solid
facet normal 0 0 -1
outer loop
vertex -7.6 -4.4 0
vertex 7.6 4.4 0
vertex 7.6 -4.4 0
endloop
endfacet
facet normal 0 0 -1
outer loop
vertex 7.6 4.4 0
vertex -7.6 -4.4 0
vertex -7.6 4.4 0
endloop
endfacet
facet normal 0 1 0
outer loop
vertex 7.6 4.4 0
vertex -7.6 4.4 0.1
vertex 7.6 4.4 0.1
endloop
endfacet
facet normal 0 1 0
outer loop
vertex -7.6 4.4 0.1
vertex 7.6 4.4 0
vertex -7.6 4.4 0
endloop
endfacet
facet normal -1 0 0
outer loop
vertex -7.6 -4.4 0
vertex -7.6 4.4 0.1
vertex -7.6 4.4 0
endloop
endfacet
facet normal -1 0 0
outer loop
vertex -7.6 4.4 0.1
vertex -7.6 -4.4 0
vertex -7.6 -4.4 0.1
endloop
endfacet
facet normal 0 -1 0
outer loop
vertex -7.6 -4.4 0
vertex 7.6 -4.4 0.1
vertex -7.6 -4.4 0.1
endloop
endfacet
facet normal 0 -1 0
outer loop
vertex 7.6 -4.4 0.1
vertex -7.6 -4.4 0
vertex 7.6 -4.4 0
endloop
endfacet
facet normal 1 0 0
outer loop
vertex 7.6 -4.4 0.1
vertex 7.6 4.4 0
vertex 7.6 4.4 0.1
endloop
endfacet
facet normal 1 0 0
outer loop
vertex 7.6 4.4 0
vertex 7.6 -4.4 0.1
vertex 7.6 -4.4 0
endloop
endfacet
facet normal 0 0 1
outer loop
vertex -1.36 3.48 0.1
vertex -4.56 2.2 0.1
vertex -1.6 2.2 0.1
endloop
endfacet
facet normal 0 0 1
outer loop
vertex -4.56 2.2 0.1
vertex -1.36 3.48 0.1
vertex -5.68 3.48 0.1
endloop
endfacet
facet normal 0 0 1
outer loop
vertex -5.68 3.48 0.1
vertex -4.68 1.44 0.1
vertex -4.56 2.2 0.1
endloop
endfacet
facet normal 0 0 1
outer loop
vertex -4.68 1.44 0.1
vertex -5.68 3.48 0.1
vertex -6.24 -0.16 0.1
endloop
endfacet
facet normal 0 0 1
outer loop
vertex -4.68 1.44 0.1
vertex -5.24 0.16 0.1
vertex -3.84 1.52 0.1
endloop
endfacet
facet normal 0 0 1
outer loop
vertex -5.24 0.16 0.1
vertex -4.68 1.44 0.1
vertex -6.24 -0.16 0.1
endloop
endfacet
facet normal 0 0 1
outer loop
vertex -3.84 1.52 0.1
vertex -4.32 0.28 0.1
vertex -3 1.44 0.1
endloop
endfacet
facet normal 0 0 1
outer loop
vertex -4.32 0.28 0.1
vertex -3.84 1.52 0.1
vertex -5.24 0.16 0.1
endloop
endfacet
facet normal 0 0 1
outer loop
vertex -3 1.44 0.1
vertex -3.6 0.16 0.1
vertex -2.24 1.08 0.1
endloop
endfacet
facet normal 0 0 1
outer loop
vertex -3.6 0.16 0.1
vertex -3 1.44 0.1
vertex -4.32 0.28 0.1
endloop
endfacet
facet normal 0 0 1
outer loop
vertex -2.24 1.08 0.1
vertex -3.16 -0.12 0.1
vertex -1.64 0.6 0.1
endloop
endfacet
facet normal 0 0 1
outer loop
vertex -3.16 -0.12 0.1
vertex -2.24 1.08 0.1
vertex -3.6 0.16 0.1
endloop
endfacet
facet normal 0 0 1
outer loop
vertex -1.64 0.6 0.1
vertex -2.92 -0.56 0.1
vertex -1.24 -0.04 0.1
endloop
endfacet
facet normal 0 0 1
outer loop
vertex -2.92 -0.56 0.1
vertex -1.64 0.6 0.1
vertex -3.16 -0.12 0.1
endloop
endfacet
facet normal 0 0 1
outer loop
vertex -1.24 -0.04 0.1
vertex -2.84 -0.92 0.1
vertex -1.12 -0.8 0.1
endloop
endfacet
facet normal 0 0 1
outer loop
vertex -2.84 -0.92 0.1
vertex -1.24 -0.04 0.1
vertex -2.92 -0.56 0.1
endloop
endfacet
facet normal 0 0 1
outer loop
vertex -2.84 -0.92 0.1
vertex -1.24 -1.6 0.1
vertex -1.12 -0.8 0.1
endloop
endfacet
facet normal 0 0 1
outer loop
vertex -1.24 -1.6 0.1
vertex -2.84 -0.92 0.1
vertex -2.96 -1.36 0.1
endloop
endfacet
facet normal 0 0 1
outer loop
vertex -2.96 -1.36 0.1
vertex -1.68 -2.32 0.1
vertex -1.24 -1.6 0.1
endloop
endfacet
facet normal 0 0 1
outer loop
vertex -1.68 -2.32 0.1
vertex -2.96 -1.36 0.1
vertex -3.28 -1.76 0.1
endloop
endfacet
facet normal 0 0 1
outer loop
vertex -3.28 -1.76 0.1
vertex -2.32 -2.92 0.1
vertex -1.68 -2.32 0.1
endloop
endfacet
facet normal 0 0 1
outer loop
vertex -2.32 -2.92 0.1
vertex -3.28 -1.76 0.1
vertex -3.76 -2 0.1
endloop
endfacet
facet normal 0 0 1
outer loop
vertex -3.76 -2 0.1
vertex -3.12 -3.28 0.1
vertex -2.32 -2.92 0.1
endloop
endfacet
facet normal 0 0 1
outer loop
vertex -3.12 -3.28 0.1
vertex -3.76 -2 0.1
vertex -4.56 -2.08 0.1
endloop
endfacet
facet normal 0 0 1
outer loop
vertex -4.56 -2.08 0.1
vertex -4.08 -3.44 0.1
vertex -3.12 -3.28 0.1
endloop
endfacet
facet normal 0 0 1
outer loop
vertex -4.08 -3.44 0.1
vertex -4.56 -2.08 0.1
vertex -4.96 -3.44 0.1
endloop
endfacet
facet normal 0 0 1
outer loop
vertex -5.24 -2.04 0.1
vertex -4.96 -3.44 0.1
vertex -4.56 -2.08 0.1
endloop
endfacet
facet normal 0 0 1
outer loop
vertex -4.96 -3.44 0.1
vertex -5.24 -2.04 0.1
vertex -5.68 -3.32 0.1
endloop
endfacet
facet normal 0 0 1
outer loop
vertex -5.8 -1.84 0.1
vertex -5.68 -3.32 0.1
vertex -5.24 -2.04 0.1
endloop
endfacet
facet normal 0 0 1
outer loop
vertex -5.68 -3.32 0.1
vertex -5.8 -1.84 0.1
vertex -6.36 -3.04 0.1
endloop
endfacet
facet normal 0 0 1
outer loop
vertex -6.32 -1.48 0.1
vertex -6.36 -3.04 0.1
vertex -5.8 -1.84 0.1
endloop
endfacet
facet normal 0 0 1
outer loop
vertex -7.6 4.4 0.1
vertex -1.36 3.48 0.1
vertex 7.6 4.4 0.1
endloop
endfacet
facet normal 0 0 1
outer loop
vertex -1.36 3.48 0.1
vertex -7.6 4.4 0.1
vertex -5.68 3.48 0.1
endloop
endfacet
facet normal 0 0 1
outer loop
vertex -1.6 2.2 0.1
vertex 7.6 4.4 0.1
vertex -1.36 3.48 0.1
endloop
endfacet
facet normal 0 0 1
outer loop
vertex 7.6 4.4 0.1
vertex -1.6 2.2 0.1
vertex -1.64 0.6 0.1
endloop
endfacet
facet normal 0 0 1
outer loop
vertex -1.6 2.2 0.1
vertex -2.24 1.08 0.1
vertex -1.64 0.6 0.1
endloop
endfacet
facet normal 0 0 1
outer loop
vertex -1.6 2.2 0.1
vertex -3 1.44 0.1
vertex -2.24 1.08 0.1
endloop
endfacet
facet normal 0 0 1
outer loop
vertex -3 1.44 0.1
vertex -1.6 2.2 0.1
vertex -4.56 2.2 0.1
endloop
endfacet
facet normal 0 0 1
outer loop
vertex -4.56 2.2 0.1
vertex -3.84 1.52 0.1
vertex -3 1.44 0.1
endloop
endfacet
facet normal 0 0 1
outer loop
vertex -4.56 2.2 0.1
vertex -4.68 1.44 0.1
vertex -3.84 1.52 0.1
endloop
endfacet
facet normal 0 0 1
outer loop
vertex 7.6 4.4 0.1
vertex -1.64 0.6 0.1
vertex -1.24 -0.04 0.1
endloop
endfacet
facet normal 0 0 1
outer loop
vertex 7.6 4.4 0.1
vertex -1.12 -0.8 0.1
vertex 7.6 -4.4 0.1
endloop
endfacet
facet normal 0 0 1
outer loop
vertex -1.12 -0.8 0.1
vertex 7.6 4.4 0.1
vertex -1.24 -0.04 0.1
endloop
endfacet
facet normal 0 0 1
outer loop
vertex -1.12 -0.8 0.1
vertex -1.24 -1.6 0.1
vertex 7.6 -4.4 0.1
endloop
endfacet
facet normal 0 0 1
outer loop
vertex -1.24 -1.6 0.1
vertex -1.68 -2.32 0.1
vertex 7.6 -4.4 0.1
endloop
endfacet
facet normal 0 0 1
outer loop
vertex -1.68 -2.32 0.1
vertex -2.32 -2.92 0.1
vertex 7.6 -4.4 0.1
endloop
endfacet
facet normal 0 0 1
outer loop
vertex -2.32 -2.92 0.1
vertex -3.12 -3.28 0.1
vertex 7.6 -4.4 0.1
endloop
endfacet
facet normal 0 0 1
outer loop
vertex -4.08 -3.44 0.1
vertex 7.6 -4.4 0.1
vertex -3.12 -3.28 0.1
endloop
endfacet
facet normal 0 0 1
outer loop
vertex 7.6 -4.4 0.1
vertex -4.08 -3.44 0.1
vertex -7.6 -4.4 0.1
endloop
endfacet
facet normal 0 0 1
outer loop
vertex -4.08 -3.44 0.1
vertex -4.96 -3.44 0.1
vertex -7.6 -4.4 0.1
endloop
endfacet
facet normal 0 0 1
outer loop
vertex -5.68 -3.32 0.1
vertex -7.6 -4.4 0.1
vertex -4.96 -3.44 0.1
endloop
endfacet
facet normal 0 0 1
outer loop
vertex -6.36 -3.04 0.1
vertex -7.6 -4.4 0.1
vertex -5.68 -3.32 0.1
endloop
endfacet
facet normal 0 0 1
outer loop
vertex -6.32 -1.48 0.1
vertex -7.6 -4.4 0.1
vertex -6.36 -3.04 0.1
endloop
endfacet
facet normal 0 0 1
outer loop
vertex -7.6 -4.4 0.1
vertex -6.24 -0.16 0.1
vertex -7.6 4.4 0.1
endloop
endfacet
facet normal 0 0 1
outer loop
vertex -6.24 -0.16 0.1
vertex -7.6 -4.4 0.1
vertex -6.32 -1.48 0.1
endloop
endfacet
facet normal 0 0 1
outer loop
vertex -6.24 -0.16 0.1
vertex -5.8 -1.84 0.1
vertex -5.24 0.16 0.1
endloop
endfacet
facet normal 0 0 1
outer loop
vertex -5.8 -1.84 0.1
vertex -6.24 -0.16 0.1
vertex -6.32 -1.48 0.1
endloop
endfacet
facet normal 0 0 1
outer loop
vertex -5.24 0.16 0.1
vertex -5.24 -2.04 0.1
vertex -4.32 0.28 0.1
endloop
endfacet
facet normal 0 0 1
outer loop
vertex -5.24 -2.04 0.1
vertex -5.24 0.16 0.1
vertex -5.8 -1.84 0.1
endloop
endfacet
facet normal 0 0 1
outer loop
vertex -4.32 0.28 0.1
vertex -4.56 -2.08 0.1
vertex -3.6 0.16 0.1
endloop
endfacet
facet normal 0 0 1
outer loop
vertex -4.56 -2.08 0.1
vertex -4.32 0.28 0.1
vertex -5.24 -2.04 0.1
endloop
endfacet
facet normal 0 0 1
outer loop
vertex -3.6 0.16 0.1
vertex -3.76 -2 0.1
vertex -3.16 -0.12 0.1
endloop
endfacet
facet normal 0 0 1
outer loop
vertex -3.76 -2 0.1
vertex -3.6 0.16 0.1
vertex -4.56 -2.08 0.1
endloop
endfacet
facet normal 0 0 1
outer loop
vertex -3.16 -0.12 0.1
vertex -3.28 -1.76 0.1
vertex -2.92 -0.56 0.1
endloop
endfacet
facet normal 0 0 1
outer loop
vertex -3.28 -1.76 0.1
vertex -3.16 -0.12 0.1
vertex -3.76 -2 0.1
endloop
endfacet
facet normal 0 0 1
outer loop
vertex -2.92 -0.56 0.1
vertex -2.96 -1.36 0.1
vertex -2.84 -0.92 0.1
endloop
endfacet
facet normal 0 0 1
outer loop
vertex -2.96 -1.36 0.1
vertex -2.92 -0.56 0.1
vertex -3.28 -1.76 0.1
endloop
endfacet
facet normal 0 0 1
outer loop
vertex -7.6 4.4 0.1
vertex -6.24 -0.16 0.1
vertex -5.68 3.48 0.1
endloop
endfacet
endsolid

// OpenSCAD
// file: ../p/box5-12.scad
use <../lib.scad>
function ldraw_lib__box5_12() = [
// 0 Box with 5 Faces without Any Edges
// 0 Name: box5-12.dat
// 0 Author: Chris Dee [cwdee]
// 0 !LDRAW_ORG Primitive UPDATE 2009-02
// 0 !LICENSE Licensed under CC BY 4.0 : see CAreadme.txt
// 
// 0 BFC CERTIFY CCW
  [0,"BFC","CERTIFY"],
  [0,"BFC","CCW"],
// 
// 0 !HISTORY 2009-09-03 [PTadmin] Official Update 2009-02
// 
// 
// 4 16 1 1 1 1 1 -1 -1 1 -1 -1 1 1
  [4,16,1,1,1,1,1,-1,-1,1,-1,-1,1,1],
// 4 16 -1 0 1 1 0 1 1 1 1 -1 1 1
  [4,16,-1,0,1,1,0,1,1,1,1,-1,1,1],
// 4 16 -1 0 -1 -1 0 1 -1 1 1 -1 1 -1
  [4,16,-1,0,-1,-1,0,1,-1,1,1,-1,1,-1],
// 4 16 1 0 -1 -1 0 -1 -1 1 -1 1 1 -1
  [4,16,1,0,-1,-1,0,-1,-1,1,-1,1,1,-1],
// 4 16 1 0 1 1 0 -1 1 1 -1 1 1 1
  [4,16,1,0,1,1,0,-1,1,1,-1,1,1,1],
// 0
];
module ldraw_lib__box5_12(step=0, col=false, unit=2/5, alt=false, line=0.2, solid=!$preview)
    makepoly(ldraw_lib__box5_12(), step=step, col=col, unit=unit, alt=alt, line=line, solid=solid);
ldraw_lib__box5_12(line=0.2);
// main file
use <../lib.scad>
use <../p/box5-12.scad>
function ldraw_lib__168055b() = [
// 0 Sticker  1.1 x  1.9 with Left White Number Five on Blue Background
// 0 Name: 168055b.dat
// 0 Author: Takeshi Takahashi [RainbowDolphin]
// 0 !LDRAW_ORG Part UPDATE 2024-03
// 0 !LICENSE Licensed under CC BY 4.0 : see CAreadme.txt
// 
// 0 BFC CERTIFY CCW
  [0,"BFC","CERTIFY"],
  [0,"BFC","CCW"],
// 
// 0 !KEYWORDS Formula 1, race car, Renault, Set 1750
// 
// 0 !HISTORY 2024-04-28 [OrionP] Official Update 2024-03
// 
// 
// 1 16 0 -0.25 0 19 0 0 0 0.25 0 0 0 11 box5-12.dat
  [1,16,0,-0.25,0,19,0,0,0,0.25,0,0,0,11, ldraw_lib__box5_12()],
// 4 15 -4 -0.25 5.5 -3.4 -0.25 8.7 -14.2 -0.25 8.7 -11.4 -0.25 5.5
  [4,15,-4,-0.25,5.5,-3.4,-0.25,8.7,-14.2,-0.25,8.7,-11.4,-0.25,5.5],
// 4 15 -11.7 -0.25 3.6 -11.4 -0.25 5.5 -14.2 -0.25 8.7 -15.6 -0.25 -0.4
  [4,15,-11.7,-0.25,3.6,-11.4,-0.25,5.5,-14.2,-0.25,8.7,-15.6,-0.25,-0.4],
// 4 15 -11.7 -0.25 3.6 -15.6 -0.25 -0.4 -13.1 -0.25 0.4 -9.6 -0.25 3.8
  [4,15,-11.7,-0.25,3.6,-15.6,-0.25,-0.4,-13.1,-0.25,0.4,-9.6,-0.25,3.8],
// 4 15 -9.6 -0.25 3.8 -13.1 -0.25 0.4 -10.8 -0.25 0.7 -7.5 -0.25 3.6
  [4,15,-9.6,-0.25,3.8,-13.1,-0.25,0.4,-10.8,-0.25,0.7,-7.5,-0.25,3.6],
// 4 15 -7.5 -0.25 3.6 -10.8 -0.25 0.7 -9 -0.25 0.4 -5.6 -0.25 2.7
  [4,15,-7.5,-0.25,3.6,-10.8,-0.25,0.7,-9,-0.25,0.4,-5.6,-0.25,2.7],
// 4 15 -5.6 -0.25 2.7 -9 -0.25 0.4 -7.9 -0.25 -0.3 -4.1 -0.25 1.5
  [4,15,-5.6,-0.25,2.7,-9,-0.25,0.4,-7.9,-0.25,-0.3,-4.1,-0.25,1.5],
// 4 15 -4.1 -0.25 1.5 -7.9 -0.25 -0.3 -7.3 -0.25 -1.4 -3.1 -0.25 -0.1
  [4,15,-4.1,-0.25,1.5,-7.9,-0.25,-0.3,-7.3,-0.25,-1.4,-3.1,-0.25,-0.1],
// 4 15 -3.1 -0.25 -0.1 -7.3 -0.25 -1.4 -7.1 -0.25 -2.3 -2.8 -0.25 -2
  [4,15,-3.1,-0.25,-0.1,-7.3,-0.25,-1.4,-7.1,-0.25,-2.3,-2.8,-0.25,-2],
// 4 15 -2.8 -0.25 -2 -7.1 -0.25 -2.3 -7.4 -0.25 -3.4 -3.1 -0.25 -4
  [4,15,-2.8,-0.25,-2,-7.1,-0.25,-2.3,-7.4,-0.25,-3.4,-3.1,-0.25,-4],
// 4 15 -4.2 -0.25 -5.8 -3.1 -0.25 -4 -7.4 -0.25 -3.4 -8.2 -0.25 -4.4
  [4,15,-4.2,-0.25,-5.8,-3.1,-0.25,-4,-7.4,-0.25,-3.4,-8.2,-0.25,-4.4],
// 4 15 -5.8 -0.25 -7.3 -4.2 -0.25 -5.8 -8.2 -0.25 -4.4 -9.4 -0.25 -5
  [4,15,-5.8,-0.25,-7.3,-4.2,-0.25,-5.8,-8.2,-0.25,-4.4,-9.4,-0.25,-5],
// 4 15 -7.8 -0.25 -8.2 -5.8 -0.25 -7.3 -9.4 -0.25 -5 -11.4 -0.25 -5.2
  [4,15,-7.8,-0.25,-8.2,-5.8,-0.25,-7.3,-9.4,-0.25,-5,-11.4,-0.25,-5.2],
// 4 15 -10.2 -0.25 -8.6 -7.8 -0.25 -8.2 -11.4 -0.25 -5.2 -12.4 -0.25 -8.6
  [4,15,-10.2,-0.25,-8.6,-7.8,-0.25,-8.2,-11.4,-0.25,-5.2,-12.4,-0.25,-8.6],
// 4 15 -12.4 -0.25 -8.6 -11.4 -0.25 -5.2 -13.1 -0.25 -5.1 -14.2 -0.25 -8.3
  [4,15,-12.4,-0.25,-8.6,-11.4,-0.25,-5.2,-13.1,-0.25,-5.1,-14.2,-0.25,-8.3],
// 4 15 -14.2 -0.25 -8.3 -13.1 -0.25 -5.1 -14.5 -0.25 -4.6 -15.9 -0.25 -7.6
  [4,15,-14.2,-0.25,-8.3,-13.1,-0.25,-5.1,-14.5,-0.25,-4.6,-15.9,-0.25,-7.6],
// 3 15 -15.8 -0.25 -3.7 -15.9 -0.25 -7.6 -14.5 -0.25 -4.6
  [3,15,-15.8,-0.25,-3.7,-15.9,-0.25,-7.6,-14.5,-0.25,-4.6],
// 4 1 -3.4 -0.25 8.7 19 -0.25 11 -19 -0.25 11 -14.2 -0.25 8.7
  [4,1,-3.4,-0.25,8.7,19,-0.25,11,-19,-0.25,11,-14.2,-0.25,8.7],
// 4 1 19 -0.25 11 -3.4 -0.25 8.7 -4 -0.25 5.5 -4.1 -0.25 1.5
  [4,1,19,-0.25,11,-3.4,-0.25,8.7,-4,-0.25,5.5,-4.1,-0.25,1.5],
// 3 1 -4 -0.25 5.5 -5.6 -0.25 2.7 -4.1 -0.25 1.5
  [3,1,-4,-0.25,5.5,-5.6,-0.25,2.7,-4.1,-0.25,1.5],
// 4 1 -7.5 -0.25 3.6 -5.6 -0.25 2.7 -4 -0.25 5.5 -11.4 -0.25 5.5
  [4,1,-7.5,-0.25,3.6,-5.6,-0.25,2.7,-4,-0.25,5.5,-11.4,-0.25,5.5],
// 3 1 -11.4 -0.25 5.5 -9.6 -0.25 3.8 -7.5 -0.25 3.6
  [3,1,-11.4,-0.25,5.5,-9.6,-0.25,3.8,-7.5,-0.25,3.6],
// 3 1 -11.4 -0.25 5.5 -11.7 -0.25 3.6 -9.6 -0.25 3.8
  [3,1,-11.4,-0.25,5.5,-11.7,-0.25,3.6,-9.6,-0.25,3.8],
// 3 1 19 -0.25 11 -4.1 -0.25 1.5 -3.1 -0.25 -0.1
  [3,1,19,-0.25,11,-4.1,-0.25,1.5,-3.1,-0.25,-0.1],
// 4 1 19 -0.25 11 -3.1 -0.25 -0.1 -2.8 -0.25 -2 19 -0.25 -11
  [4,1,19,-0.25,11,-3.1,-0.25,-0.1,-2.8,-0.25,-2,19,-0.25,-11],
// 3 1 -2.8 -0.25 -2 -3.1 -0.25 -4 19 -0.25 -11
  [3,1,-2.8,-0.25,-2,-3.1,-0.25,-4,19,-0.25,-11],
// 3 1 -3.1 -0.25 -4 -4.2 -0.25 -5.8 19 -0.25 -11
  [3,1,-3.1,-0.25,-4,-4.2,-0.25,-5.8,19,-0.25,-11],
// 3 1 -4.2 -0.25 -5.8 -5.8 -0.25 -7.3 19 -0.25 -11
  [3,1,-4.2,-0.25,-5.8,-5.8,-0.25,-7.3,19,-0.25,-11],
// 3 1 -5.8 -0.25 -7.3 -7.8 -0.25 -8.2 19 -0.25 -11
  [3,1,-5.8,-0.25,-7.3,-7.8,-0.25,-8.2,19,-0.25,-11],
// 4 1 19 -0.25 -11 -7.8 -0.25 -8.2 -10.2 -0.25 -8.6 -19 -0.25 -11
  [4,1,19,-0.25,-11,-7.8,-0.25,-8.2,-10.2,-0.25,-8.6,-19,-0.25,-11],
// 3 1 -10.2 -0.25 -8.6 -12.4 -0.25 -8.6 -19 -0.25 -11
  [3,1,-10.2,-0.25,-8.6,-12.4,-0.25,-8.6,-19,-0.25,-11],
// 3 1 -14.2 -0.25 -8.3 -19 -0.25 -11 -12.4 -0.25 -8.6
  [3,1,-14.2,-0.25,-8.3,-19,-0.25,-11,-12.4,-0.25,-8.6],
// 3 1 -15.9 -0.25 -7.6 -19 -0.25 -11 -14.2 -0.25 -8.3
  [3,1,-15.9,-0.25,-7.6,-19,-0.25,-11,-14.2,-0.25,-8.3],
// 3 1 -15.8 -0.25 -3.7 -19 -0.25 -11 -15.9 -0.25 -7.6
  [3,1,-15.8,-0.25,-3.7,-19,-0.25,-11,-15.9,-0.25,-7.6],
// 4 1 -19 -0.25 -11 -15.8 -0.25 -3.7 -15.6 -0.25 -0.4 -19 -0.25 11
  [4,1,-19,-0.25,-11,-15.8,-0.25,-3.7,-15.6,-0.25,-0.4,-19,-0.25,11],
// 4 1 -13.1 -0.25 0.4 -15.6 -0.25 -0.4 -15.8 -0.25 -3.7 -14.5 -0.25 -4.6
  [4,1,-13.1,-0.25,0.4,-15.6,-0.25,-0.4,-15.8,-0.25,-3.7,-14.5,-0.25,-4.6],
// 4 1 -10.8 -0.25 0.7 -13.1 -0.25 0.4 -14.5 -0.25 -4.6 -13.1 -0.25 -5.1
  [4,1,-10.8,-0.25,0.7,-13.1,-0.25,0.4,-14.5,-0.25,-4.6,-13.1,-0.25,-5.1],
// 4 1 -9 -0.25 0.4 -10.8 -0.25 0.7 -13.1 -0.25 -5.1 -11.4 -0.25 -5.2
  [4,1,-9,-0.25,0.4,-10.8,-0.25,0.7,-13.1,-0.25,-5.1,-11.4,-0.25,-5.2],
// 4 1 -7.9 -0.25 -0.3 -9 -0.25 0.4 -11.4 -0.25 -5.2 -9.4 -0.25 -5
  [4,1,-7.9,-0.25,-0.3,-9,-0.25,0.4,-11.4,-0.25,-5.2,-9.4,-0.25,-5],
// 4 1 -7.3 -0.25 -1.4 -7.9 -0.25 -0.3 -9.4 -0.25 -5 -8.2 -0.25 -4.4
  [4,1,-7.3,-0.25,-1.4,-7.9,-0.25,-0.3,-9.4,-0.25,-5,-8.2,-0.25,-4.4],
// 4 1 -7.1 -0.25 -2.3 -7.3 -0.25 -1.4 -8.2 -0.25 -4.4 -7.4 -0.25 -3.4
  [4,1,-7.1,-0.25,-2.3,-7.3,-0.25,-1.4,-8.2,-0.25,-4.4,-7.4,-0.25,-3.4],
// 3 1 -19 -0.25 11 -15.6 -0.25 -0.4 -14.2 -0.25 8.7
  [3,1,-19,-0.25,11,-15.6,-0.25,-0.4,-14.2,-0.25,8.7],
];
module ldraw_lib__168055b(step=0, col=false, unit=2/5, alt=false, line=0.2, solid=!$preview)
    makepoly(ldraw_lib__168055b(), step=step, col=col, unit=unit, alt=alt, line=line, solid=solid);
ldraw_lib__168055b(line=0.2);
